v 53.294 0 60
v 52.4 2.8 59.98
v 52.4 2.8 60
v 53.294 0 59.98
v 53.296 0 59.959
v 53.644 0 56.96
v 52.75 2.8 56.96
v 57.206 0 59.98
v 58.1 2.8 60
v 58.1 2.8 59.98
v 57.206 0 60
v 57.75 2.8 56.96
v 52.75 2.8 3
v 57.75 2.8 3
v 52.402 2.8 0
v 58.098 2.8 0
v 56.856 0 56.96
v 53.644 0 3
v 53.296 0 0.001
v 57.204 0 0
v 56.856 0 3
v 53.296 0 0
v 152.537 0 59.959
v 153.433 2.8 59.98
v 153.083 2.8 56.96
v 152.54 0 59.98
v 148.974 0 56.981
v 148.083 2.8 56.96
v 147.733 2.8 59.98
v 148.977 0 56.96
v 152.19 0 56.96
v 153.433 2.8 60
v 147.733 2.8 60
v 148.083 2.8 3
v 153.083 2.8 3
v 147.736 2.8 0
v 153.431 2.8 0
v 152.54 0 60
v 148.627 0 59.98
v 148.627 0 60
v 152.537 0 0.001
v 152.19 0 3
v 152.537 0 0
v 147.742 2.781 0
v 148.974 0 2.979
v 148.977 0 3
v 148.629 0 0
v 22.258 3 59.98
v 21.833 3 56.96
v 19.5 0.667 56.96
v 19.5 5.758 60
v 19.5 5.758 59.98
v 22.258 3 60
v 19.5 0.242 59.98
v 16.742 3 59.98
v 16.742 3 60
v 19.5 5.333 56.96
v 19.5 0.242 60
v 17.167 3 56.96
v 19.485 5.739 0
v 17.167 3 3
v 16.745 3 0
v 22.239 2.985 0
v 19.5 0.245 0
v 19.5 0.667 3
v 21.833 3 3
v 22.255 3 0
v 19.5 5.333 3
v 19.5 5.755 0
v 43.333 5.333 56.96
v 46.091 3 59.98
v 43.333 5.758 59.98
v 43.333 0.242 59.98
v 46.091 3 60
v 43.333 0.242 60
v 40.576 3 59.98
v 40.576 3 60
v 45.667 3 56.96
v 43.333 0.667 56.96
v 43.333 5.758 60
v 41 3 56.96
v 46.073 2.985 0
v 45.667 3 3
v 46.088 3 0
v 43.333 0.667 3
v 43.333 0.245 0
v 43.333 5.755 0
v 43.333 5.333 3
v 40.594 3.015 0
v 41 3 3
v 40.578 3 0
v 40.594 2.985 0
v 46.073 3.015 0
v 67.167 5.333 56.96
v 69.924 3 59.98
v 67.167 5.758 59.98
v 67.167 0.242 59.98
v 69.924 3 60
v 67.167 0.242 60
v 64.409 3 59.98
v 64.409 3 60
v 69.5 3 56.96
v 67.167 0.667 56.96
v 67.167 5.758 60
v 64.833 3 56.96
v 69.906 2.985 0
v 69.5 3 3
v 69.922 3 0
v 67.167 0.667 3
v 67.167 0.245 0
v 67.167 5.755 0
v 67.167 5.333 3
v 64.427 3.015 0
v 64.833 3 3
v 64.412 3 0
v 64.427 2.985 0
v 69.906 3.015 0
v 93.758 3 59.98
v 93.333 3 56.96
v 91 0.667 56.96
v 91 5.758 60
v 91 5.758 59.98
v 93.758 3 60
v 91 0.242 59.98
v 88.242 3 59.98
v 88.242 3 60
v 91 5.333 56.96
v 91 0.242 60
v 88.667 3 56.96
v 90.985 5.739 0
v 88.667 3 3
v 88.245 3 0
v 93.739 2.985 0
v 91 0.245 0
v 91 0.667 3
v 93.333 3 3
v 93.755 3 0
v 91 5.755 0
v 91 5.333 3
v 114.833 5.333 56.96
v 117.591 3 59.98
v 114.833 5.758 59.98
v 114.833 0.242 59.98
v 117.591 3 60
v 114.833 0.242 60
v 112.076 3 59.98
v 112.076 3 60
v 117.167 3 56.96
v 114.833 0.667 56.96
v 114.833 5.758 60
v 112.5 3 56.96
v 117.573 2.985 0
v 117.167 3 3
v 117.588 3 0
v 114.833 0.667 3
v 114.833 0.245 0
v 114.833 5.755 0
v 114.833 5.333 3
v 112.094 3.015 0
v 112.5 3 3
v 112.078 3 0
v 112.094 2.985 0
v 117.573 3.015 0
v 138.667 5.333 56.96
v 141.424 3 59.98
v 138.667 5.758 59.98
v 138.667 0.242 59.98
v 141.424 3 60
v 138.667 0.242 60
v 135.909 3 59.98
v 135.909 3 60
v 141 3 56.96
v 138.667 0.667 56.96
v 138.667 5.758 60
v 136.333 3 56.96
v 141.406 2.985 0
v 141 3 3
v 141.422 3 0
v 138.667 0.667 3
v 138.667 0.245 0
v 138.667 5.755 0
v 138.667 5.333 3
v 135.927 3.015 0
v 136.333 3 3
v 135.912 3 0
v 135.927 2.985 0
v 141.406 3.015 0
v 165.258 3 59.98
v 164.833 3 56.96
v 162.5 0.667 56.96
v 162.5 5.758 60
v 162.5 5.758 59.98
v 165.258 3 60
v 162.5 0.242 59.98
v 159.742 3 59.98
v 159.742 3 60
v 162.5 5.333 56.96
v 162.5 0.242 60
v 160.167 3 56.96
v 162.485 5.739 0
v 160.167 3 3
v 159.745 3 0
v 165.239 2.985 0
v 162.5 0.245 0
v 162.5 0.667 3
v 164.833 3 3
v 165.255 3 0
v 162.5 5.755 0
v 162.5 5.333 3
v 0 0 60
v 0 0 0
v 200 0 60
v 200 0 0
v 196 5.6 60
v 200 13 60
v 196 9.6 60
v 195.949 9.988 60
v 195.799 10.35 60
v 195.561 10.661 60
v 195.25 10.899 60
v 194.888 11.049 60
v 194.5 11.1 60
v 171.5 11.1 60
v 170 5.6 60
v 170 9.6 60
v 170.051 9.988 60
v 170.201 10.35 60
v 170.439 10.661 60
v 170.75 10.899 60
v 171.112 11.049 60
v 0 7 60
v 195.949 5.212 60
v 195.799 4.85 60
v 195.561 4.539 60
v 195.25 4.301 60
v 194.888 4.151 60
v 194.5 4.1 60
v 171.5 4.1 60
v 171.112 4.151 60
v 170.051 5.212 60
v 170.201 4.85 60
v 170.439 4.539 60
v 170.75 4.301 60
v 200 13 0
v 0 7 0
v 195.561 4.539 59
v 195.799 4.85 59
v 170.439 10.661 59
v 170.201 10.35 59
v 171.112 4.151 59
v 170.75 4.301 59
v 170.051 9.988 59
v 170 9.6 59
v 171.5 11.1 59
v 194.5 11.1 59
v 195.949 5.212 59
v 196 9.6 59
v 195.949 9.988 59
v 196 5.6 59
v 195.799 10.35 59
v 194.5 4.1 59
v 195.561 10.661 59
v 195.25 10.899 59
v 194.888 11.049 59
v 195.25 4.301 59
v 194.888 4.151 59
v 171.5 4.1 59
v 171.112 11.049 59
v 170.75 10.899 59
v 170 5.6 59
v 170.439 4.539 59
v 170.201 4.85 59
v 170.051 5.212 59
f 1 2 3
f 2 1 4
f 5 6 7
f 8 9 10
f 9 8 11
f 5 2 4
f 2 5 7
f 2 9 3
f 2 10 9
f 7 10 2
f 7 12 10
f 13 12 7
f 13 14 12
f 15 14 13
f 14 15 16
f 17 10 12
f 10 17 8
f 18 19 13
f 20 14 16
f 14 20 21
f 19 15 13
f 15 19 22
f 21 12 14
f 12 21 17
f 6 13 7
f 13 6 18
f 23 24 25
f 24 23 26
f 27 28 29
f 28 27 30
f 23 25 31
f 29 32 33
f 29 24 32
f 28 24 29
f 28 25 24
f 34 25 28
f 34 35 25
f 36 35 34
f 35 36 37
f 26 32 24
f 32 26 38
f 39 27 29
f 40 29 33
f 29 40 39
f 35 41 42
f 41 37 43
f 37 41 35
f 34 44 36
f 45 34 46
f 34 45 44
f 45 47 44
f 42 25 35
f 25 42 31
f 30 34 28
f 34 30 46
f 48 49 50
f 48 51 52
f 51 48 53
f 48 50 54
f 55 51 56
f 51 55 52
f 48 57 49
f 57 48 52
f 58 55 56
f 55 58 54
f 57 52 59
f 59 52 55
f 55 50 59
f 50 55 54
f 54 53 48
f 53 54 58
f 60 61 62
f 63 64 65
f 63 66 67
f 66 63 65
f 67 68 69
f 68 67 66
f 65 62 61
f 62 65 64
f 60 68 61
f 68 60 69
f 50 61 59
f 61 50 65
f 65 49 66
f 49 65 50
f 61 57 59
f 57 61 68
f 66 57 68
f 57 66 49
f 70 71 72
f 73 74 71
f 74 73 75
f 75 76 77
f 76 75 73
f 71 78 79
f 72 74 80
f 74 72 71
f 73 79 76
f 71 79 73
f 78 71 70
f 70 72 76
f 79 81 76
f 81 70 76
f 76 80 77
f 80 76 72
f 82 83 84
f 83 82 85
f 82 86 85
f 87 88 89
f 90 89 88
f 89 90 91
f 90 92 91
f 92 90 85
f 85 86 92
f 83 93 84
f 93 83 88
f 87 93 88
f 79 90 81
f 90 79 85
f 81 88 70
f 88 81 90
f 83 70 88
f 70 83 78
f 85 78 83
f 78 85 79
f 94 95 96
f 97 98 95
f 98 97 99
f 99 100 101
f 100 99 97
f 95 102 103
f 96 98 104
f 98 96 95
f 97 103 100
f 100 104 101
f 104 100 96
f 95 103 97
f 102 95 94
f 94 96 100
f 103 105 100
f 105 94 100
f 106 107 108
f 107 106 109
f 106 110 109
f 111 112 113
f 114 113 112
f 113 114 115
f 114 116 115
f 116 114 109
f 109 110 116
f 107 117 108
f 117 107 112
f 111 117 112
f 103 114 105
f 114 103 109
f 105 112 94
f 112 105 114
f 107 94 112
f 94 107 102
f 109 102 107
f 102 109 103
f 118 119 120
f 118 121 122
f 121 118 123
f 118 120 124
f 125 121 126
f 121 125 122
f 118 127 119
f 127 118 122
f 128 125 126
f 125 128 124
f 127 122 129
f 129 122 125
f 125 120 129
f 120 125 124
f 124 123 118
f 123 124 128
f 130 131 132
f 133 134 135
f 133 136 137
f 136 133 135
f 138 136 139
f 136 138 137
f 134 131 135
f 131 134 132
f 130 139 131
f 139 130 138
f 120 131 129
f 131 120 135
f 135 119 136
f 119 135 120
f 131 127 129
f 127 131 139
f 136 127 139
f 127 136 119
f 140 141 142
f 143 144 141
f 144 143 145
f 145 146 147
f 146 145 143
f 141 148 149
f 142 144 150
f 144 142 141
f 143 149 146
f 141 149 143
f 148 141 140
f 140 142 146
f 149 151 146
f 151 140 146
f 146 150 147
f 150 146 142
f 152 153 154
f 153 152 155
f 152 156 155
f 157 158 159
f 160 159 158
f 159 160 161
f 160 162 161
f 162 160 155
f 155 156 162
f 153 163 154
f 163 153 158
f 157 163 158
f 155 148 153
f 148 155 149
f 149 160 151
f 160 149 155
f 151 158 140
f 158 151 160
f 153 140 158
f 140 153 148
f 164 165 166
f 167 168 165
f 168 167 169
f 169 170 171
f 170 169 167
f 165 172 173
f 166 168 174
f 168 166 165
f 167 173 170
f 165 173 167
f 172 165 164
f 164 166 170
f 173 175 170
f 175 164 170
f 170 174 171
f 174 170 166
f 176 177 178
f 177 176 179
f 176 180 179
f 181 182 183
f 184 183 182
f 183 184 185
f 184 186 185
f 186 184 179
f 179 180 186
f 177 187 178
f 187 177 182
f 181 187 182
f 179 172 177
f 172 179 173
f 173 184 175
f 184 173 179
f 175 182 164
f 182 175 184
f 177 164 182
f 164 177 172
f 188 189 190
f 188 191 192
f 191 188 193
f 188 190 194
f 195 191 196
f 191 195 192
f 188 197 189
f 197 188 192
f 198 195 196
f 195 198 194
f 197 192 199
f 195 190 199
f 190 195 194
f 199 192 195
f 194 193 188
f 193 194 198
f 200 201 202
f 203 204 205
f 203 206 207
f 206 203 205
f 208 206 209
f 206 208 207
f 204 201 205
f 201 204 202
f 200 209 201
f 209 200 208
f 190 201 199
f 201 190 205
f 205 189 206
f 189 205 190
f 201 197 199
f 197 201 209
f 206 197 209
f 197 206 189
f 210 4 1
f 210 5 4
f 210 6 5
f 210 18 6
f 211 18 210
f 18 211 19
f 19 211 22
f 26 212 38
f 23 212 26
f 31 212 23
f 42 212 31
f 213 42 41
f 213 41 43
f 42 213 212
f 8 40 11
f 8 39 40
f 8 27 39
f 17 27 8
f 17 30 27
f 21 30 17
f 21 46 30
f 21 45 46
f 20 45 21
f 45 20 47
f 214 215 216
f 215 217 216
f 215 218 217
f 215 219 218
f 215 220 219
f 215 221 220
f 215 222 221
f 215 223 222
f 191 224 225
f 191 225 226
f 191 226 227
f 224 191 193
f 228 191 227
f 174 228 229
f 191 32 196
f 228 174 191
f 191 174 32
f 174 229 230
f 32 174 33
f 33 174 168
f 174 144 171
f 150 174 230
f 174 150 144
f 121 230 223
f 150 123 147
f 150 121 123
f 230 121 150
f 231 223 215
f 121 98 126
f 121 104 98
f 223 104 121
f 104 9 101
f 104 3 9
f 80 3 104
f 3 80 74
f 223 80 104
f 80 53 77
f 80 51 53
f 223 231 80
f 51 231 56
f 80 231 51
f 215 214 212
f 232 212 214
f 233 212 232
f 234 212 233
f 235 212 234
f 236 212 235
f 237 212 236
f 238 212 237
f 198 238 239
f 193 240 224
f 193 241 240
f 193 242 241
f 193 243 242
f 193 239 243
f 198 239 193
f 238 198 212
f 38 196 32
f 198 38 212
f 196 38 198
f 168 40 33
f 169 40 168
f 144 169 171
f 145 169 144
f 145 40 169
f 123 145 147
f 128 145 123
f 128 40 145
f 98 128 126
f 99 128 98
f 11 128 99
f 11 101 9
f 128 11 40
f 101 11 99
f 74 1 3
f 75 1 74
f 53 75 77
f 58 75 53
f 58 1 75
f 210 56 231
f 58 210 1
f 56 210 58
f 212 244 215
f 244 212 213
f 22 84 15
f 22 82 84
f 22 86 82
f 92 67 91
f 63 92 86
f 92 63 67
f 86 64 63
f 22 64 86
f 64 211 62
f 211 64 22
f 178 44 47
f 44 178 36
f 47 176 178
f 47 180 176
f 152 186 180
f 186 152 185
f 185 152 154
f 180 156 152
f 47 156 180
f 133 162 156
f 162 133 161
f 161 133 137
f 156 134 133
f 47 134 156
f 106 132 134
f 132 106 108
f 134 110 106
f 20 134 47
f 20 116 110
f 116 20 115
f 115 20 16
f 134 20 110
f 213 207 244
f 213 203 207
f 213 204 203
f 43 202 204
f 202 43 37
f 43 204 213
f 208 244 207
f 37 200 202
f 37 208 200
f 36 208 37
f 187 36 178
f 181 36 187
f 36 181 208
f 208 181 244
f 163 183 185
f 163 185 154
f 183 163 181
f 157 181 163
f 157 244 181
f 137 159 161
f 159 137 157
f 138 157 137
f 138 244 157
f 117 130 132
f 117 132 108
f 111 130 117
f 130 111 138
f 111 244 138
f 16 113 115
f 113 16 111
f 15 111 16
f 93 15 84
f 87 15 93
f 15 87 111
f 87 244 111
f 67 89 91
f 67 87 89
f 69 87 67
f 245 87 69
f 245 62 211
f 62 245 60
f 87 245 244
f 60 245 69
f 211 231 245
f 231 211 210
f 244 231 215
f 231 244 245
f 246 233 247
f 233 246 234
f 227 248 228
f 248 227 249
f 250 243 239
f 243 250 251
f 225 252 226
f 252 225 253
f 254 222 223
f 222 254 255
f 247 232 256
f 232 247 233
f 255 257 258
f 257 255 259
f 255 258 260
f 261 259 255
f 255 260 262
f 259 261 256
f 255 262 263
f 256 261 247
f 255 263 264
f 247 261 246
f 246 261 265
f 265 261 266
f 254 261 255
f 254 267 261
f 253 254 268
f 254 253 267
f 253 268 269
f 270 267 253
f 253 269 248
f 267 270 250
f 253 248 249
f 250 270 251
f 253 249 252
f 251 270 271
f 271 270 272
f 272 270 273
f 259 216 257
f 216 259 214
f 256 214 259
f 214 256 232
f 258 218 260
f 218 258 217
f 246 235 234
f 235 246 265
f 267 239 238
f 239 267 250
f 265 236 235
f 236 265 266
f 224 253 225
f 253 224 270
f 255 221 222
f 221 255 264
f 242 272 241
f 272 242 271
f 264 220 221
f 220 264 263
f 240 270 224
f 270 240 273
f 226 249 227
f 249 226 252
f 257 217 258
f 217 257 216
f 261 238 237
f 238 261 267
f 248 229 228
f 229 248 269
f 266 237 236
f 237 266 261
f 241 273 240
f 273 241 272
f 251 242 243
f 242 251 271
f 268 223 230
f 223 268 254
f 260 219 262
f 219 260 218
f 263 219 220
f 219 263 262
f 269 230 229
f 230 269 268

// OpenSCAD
// file: lib/label.scad
/* Rounded side recess for an adhesive polyester part-number label. */

module rounded_rectangle_2d(length_x, height_z, corner_radius) {
    assert(length_x > 2 * corner_radius,
        "Label recess length must exceed twice the corner radius");
    assert(height_z > 2 * corner_radius,
        "Label recess height must exceed twice the corner radius");

    hull()
        for (x_sign = [-1, 1], z_sign = [-1, 1])
            translate([
                x_sign * (length_x / 2 - corner_radius),
                z_sign * (height_z / 2 - corner_radius)
            ])
                circle(r = corner_radius, $fn = 24);
}

module side_label_recess_cut(
    side,
    wedge_width,
    center_x,
    center_z,
    length_x,
    height_z,
    corner_radius,
    depth,
    epsilon = 0.02
) {
    assert(side == "front" || side == "back",
        "Label side must be front or back");
    assert(depth > 0 && depth < wedge_width,
        "Label recess depth must be positive and less than wedge width");

    if (side == "front")
        translate([center_x, -epsilon, center_z])
            rotate([-90, 0, 0])
                linear_extrude(height = depth + epsilon, convexity = 10)
                    rounded_rectangle_2d(
                        length_x,
                        height_z,
                        corner_radius
                    );
    else
        translate([center_x, wedge_width + epsilon, center_z])
            rotate([90, 0, 0])
                linear_extrude(height = depth + epsilon, convexity = 10)
                    rounded_rectangle_2d(
                        length_x,
                        height_z,
                        corner_radius
                    );
}
// file: lib/dovetail.scad
/* Transverse dovetail geometry with canonical two-ended entry relief. */

function female_dovetail_points(
    center_x,
    head_width,
    neck_width,
    depth,
    epsilon = 0.02
) = [
    [center_x - neck_width / 2, -epsilon],
    [center_x + neck_width / 2, -epsilon],
    [center_x + head_width / 2, depth],
    [center_x - head_width / 2, depth]
];

function male_dovetail_points(center_x, head_width, neck_width, depth) = [
    [center_x - neck_width / 2, 0],
    [center_x + neck_width / 2, 0],
    [center_x + head_width / 2, depth],
    [center_x - head_width / 2, depth]
];

module prism_along_y(points, y_start, length) {
    translate([0, y_start + length, 0])
        rotate([90, 0, 0])
            linear_extrude(height = length, convexity = 10)
                polygon(points = points);
}

module section_at_y(points, y_position, thickness = 0.04) {
    prism_along_y(points, y_position, thickness);
}

module dovetail_socket_cut(
    center_x,
    span_y,
    head_width,
    neck_width,
    depth,
    entry_length,
    entry_relief,
    epsilon = 0.02
) {
    nominal = female_dovetail_points(
        center_x,
        head_width,
        neck_width,
        depth,
        epsilon
    );
    relieved = female_dovetail_points(
        center_x,
        head_width + 2 * entry_relief,
        neck_width + 2 * entry_relief,
        depth,
        epsilon
    );

    prism_along_y(nominal, -epsilon, span_y + 2 * epsilon);

    if (entry_length > 0 && entry_relief > 0) {
        hull() {
            section_at_y(relieved, -epsilon);
            section_at_y(nominal, entry_length);
        }
        hull() {
            section_at_y(nominal, span_y - entry_length);
            section_at_y(relieved, span_y + epsilon);
        }
    }
}

module male_dovetail_rail(
    span_y,
    head_width,
    neck_width,
    depth
) {
    prism_along_y(
        male_dovetail_points(0, head_width, neck_width, depth),
        0,
        span_y
    );
}
// file: lib/components.scad
/* Role-specific wedge components assembled from shared geometry. */

use <wedge.scad>
use <dovetail.scad>
use <registers.scad>
use <label.scad>

function midpoint(a, b) = (a + b) / 2;

function upper_mount_x_1(
    wedge_length,
    nominal_height,
    total_height_range,
    height_step,
    lower_register_center_x,
    lower_register_pitch,
    register_center_depth
) = midpoint(
    upper_register_local_x(
        -2,
        wedge_length,
        total_height_range,
        height_step,
        lower_register_center_x,
        lower_register_pitch,
        register_center_depth,
        nominal_height
    ),
    upper_register_local_x(
        -1,
        wedge_length,
        total_height_range,
        height_step,
        lower_register_center_x,
        lower_register_pitch,
        register_center_depth,
        nominal_height
    )
);

function upper_mount_x_2(
    wedge_length,
    nominal_height,
    total_height_range,
    height_step,
    lower_register_center_x,
    lower_register_pitch,
    register_center_depth
) = midpoint(
    upper_register_local_x(
        2,
        wedge_length,
        total_height_range,
        height_step,
        lower_register_center_x,
        lower_register_pitch,
        register_center_depth,
        nominal_height
    ),
    upper_register_local_x(
        3,
        wedge_length,
        total_height_range,
        height_step,
        lower_register_center_x,
        lower_register_pitch,
        register_center_depth,
        nominal_height
    )
);

function label_recess_length(wedge_length) = min(26, wedge_length * 0.18);
function label_recess_height() = 7;
function label_recess_end_margin() = 4;
function label_recess_top_margin() = 1;
function label_recess_corner_radius() = 1.5;

function label_recess_left_x(wedge_length) =
    wedge_length - label_recess_end_margin() - label_recess_length(wedge_length);

function label_recess_center_x(wedge_length) =
    label_recess_left_x(wedge_length) + label_recess_length(wedge_length) / 2;

function label_recess_center_z(
    wedge_length,
    nominal_height,
    total_height_range
) = wedge_height_at(
        label_recess_left_x(wedge_length),
        wedge_length,
        nominal_height,
        total_height_range
    )
    - label_recess_top_margin()
    - label_recess_height() / 2;

module mounting_socket_cuts(
    mounting_choice,
    wedge_width,
    x_1,
    x_2,
    dovetail_bridge_width,
    dovetail_neck_width,
    dovetail_depth,
    dovetail_entry_length,
    dovetail_entry_relief,
    epsilon = 0.02
) {
    if (mounting_choice == "single_dovetail"
        || mounting_choice == "two_dovetails")
        dovetail_socket_cut(
            x_1,
            wedge_width,
            dovetail_bridge_width,
            dovetail_neck_width,
            dovetail_depth,
            dovetail_entry_length,
            dovetail_entry_relief,
            epsilon
        );

    if (mounting_choice == "two_dovetails")
        dovetail_socket_cut(
            x_2,
            wedge_width,
            dovetail_bridge_width,
            dovetail_neck_width,
            dovetail_depth,
            dovetail_entry_length,
            dovetail_entry_relief,
            epsilon
        );
}

module lower_base_model(
    wedge_length,
    wedge_width,
    nominal_height,
    total_height_range,
    mounting_choice,
    dovetail_bridge_width,
    dovetail_neck_width,
    dovetail_depth,
    dovetail_entry_length,
    dovetail_entry_relief,
    include_registers,
    lower_register_center_x,
    lower_register_pitch,
    register_center_depth,
    diamond_square_side,
    diamond_entry_length,
    diamond_entry_relief,
    include_label_recess,
    label_recess_depth,
    epsilon = 0.02
) {
    lower_mount_x_1 = wedge_length * 0.25;
    lower_mount_x_2 = wedge_length * 0.75;

    difference() {
        smooth_wedge(
            wedge_length,
            wedge_width,
            nominal_height,
            total_height_range
        );

        mounting_socket_cuts(
            mounting_choice,
            wedge_width,
            lower_mount_x_1,
            lower_mount_x_2,
            dovetail_bridge_width,
            dovetail_neck_width,
            dovetail_depth,
            dovetail_entry_length,
            dovetail_entry_relief,
            epsilon
        );

        if (include_registers)
            lower_register_row(
                wedge_width,
                lower_register_center_x,
                lower_register_pitch,
                register_center_depth,
                diamond_square_side,
                diamond_entry_length,
                diamond_entry_relief,
                epsilon
            );

        if (include_label_recess)
            side_label_recess_cut(
                "back",
                wedge_width,
                label_recess_center_x(wedge_length),
                label_recess_center_z(
                    wedge_length,
                    nominal_height,
                    total_height_range
                ),
                label_recess_length(wedge_length),
                label_recess_height(),
                label_recess_corner_radius(),
                label_recess_depth,
                epsilon
            );
    }
}

module upper_slide_model(
    wedge_length,
    wedge_width,
    nominal_height,
    total_height_range,
    height_step,
    mounting_choice,
    dovetail_bridge_width,
    dovetail_neck_width,
    dovetail_depth,
    dovetail_entry_length,
    dovetail_entry_relief,
    include_registers,
    lower_register_center_x,
    lower_register_pitch,
    register_center_depth,
    diamond_square_side,
    diamond_entry_length,
    diamond_entry_relief,
    include_label_recess,
    label_recess_depth,
    epsilon = 0.02
) {
    upper_mount_1 = upper_mount_x_1(
        wedge_length,
        nominal_height,
        total_height_range,
        height_step,
        lower_register_center_x,
        lower_register_pitch,
        register_center_depth
    );
    upper_mount_2 = upper_mount_x_2(
        wedge_length,
        nominal_height,
        total_height_range,
        height_step,
        lower_register_center_x,
        lower_register_pitch,
        register_center_depth
    );

    difference() {
        smooth_wedge(
            wedge_length,
            wedge_width,
            nominal_height,
            total_height_range
        );

        mounting_socket_cuts(
            mounting_choice,
            wedge_width,
            upper_mount_1,
            upper_mount_2,
            dovetail_bridge_width,
            dovetail_neck_width,
            dovetail_depth,
            dovetail_entry_length,
            dovetail_entry_relief,
            epsilon
        );

        if (include_registers)
            upper_register_row(
                wedge_length,
                wedge_width,
                nominal_height,
                total_height_range,
                height_step,
                lower_register_center_x,
                lower_register_pitch,
                register_center_depth,
                diamond_square_side,
                diamond_entry_length,
                diamond_entry_relief,
                epsilon
            );

        if (include_label_recess)
            side_label_recess_cut(
                "front",
                wedge_width,
                label_recess_center_x(wedge_length),
                label_recess_center_z(
                    wedge_length,
                    nominal_height,
                    total_height_range
                ),
                label_recess_length(wedge_length),
                label_recess_height(),
                label_recess_corner_radius(),
                label_recess_depth,
                epsilon
            );
    }
}
// file: lib/registers.scad
/* Diamond garden-stake registers and seven-position kinematics. */

function lock_positions() = [-3, -2, -1, 0, 1, 2, 3];

function travel_per_height_step(
    wedge_length,
    total_height_range,
    height_step
) = height_step / (total_height_range / wedge_length);

function lock_shift(
    position,
    wedge_length,
    total_height_range,
    height_step
) = position * travel_per_height_step(
    wedge_length,
    total_height_range,
    height_step
);

function lock_height(position, nominal_height, height_step) =
    nominal_height + position * height_step;

function lower_register_x(position, center_x, pitch) =
    center_x + position * pitch;

function nominal_lock_dx(nominal_height, register_center_depth) =
    nominal_height - 2 * register_center_depth;

function upper_register_local_x(
    position,
    wedge_length,
    total_height_range,
    height_step,
    lower_center_x,
    lower_pitch,
    register_center_depth,
    nominal_height
) =
    wedge_length
    + lock_shift(position, wedge_length, total_height_range, height_step)
    - lower_register_x(position, lower_center_x, lower_pitch)
    - nominal_lock_dx(nominal_height, register_center_depth);

function upper_register_global_x(
    position,
    wedge_length,
    total_height_range,
    height_step,
    upper_local_x
) =
    wedge_length
    + lock_shift(position, wedge_length, total_height_range, height_step)
    - upper_local_x;

function diamond_half_diagonal(square_side) = square_side / sqrt(2);

function diamond_points(center_x, center_z, square_side) = [
    [center_x, center_z - diamond_half_diagonal(square_side)],
    [center_x + diamond_half_diagonal(square_side), center_z],
    [center_x, center_z + diamond_half_diagonal(square_side)],
    [center_x - diamond_half_diagonal(square_side), center_z]
];

module register_prism_along_y(points, y_start, length) {
    translate([0, y_start + length, 0])
        rotate([90, 0, 0])
            linear_extrude(height = length, convexity = 10)
                polygon(points = points);
}

module register_section_at_y(points, y_position, thickness = 0.04) {
    register_prism_along_y(points, y_position, thickness);
}

module diamond_tunnel_cut(
    center_x,
    center_z,
    span_y,
    square_side,
    entry_length,
    entry_relief,
    epsilon = 0.02
) {
    nominal = diamond_points(center_x, center_z, square_side);
    relieved = diamond_points(
        center_x,
        center_z,
        square_side + 2 * entry_relief
    );

    register_prism_along_y(
        nominal,
        -epsilon,
        span_y + 2 * epsilon
    );

    if (entry_length > 0 && entry_relief > 0) {
        hull() {
            register_section_at_y(relieved, -epsilon);
            register_section_at_y(nominal, entry_length);
        }
        hull() {
            register_section_at_y(nominal, span_y - entry_length);
            register_section_at_y(relieved, span_y + epsilon);
        }
    }
}

module lower_register_row(
    wedge_width,
    center_x,
    pitch,
    center_z,
    square_side,
    entry_length,
    entry_relief,
    epsilon = 0.02
) {
    for (position = lock_positions())
        diamond_tunnel_cut(
            lower_register_x(position, center_x, pitch),
            center_z,
            wedge_width,
            square_side,
            entry_length,
            entry_relief,
            epsilon
        );
}

module upper_register_row(
    wedge_length,
    wedge_width,
    nominal_height,
    total_height_range,
    height_step,
    lower_center_x,
    lower_pitch,
    center_z,
    square_side,
    entry_length,
    entry_relief,
    epsilon = 0.02
) {
    for (position = lock_positions())
        diamond_tunnel_cut(
            upper_register_local_x(
                position,
                wedge_length,
                total_height_range,
                height_step,
                lower_center_x,
                lower_pitch,
                center_z,
                nominal_height
            ),
            center_z,
            wedge_width,
            square_side,
            entry_length,
            entry_relief,
            epsilon
        );
}

module rod_along_y(x, y_start, z, length, radius, facets = 32) {
    translate([x, y_start, z])
        rotate([-90, 0, 0])
            cylinder(h = length, r = radius, $fn = facets);
}

module garden_stake_preview(
    lower_x,
    lower_z,
    upper_x,
    upper_z,
    wedge_width,
    wire_diameter,
    handle_offset = 10,
    tip_overhang = 8
) {
    radius = wire_diameter / 2;
    y_start = -handle_offset;
    leg_length = wedge_width + handle_offset + tip_overhang;

    rod_along_y(lower_x, y_start, lower_z, leg_length, radius);
    rod_along_y(upper_x, y_start, upper_z, leg_length, radius);

    hull() {
        translate([lower_x, y_start, lower_z]) sphere(r = radius, $fn = 24);
        translate([upper_x, y_start, upper_z]) sphere(r = radius, $fn = 24);
    }
}
// file: lib/wedge.scad
/* Shared smooth wedge geometry. */

function wedge_thin_end(nominal_height, total_height_range) =
    (nominal_height - total_height_range) / 2;

function wedge_thick_end(nominal_height, total_height_range) =
    (nominal_height + total_height_range) / 2;

function wedge_slope(wedge_length, total_height_range) =
    total_height_range / wedge_length;

function wedge_angle(wedge_length, total_height_range) =
    atan(wedge_slope(wedge_length, total_height_range));

function wedge_height_at(
    x,
    wedge_length,
    nominal_height,
    total_height_range
) =
    wedge_thin_end(nominal_height, total_height_range)
    + wedge_slope(wedge_length, total_height_range) * x;

module smooth_wedge(
    wedge_length,
    wedge_width,
    nominal_height,
    total_height_range
) {
    thin_end = wedge_thin_end(nominal_height, total_height_range);
    thick_end = wedge_thick_end(nominal_height, total_height_range);

    polyhedron(
        points = [
            [0,            0,           0],
            [wedge_length, 0,           0],
            [wedge_length, wedge_width, 0],
            [0,            wedge_width, 0],
            [0,            0,           thin_end],
            [wedge_length, 0,           thick_end],
            [wedge_length, wedge_width, thick_end],
            [0,            wedge_width, thin_end]
        ],
        faces = [
            [0, 3, 2, 1],
            [0, 1, 5, 4],
            [1, 2, 6, 5],
            [2, 3, 7, 6],
            [3, 0, 4, 7],
            [4, 5, 6, 7]
        ],
        convexity = 10
    );
}
// main file
/*
  Locking Wedge — upper slide
  Batch 003

  Default output is rotated onto the side opposite the label recess,
  leaving the rounded label pocket facing upward for support-free printing.
  Reverse this part over the lower base during assembly.
*/

use <lib/wedge.scad>
use <lib/registers.scad>
use <lib/components.scad>

// ---------- Wedge ----------

wedge_length = 200;       // [100:1:200]
wedge_width = 60;         // [20:1:180]
nominal_height = 20;      // [10:0.5:50]
total_height_range = 6;   // [2:0.5:20]
height_step = 1.0;        // [0.5:0.5:2]
print_on_side = true;

// ---------- Transverse mounting sockets ----------

mounting_choice = "two_dovetails"; // [none:No mounting sockets,single_dovetail:One female dovetail,two_dovetails:Two female dovetails]
dovetail_bridge_width = 5.0; // [4:0.1:6]
dovetail_neck_width = 3.2;   // [2.4:0.1:5]
dovetail_depth = 2.8;        // [1.5:0.1:4]
dovetail_entry_length = 3.0; // [1:0.5:8]
dovetail_entry_relief = 0.35;// [0.1:0.05:1]

// ---------- Garden-stake registers ----------

include_registers = true;
lower_register_center_x = 95; // Must match lower_base.scad
lower_register_pitch = 9.5;   // Must match lower_base.scad
register_center_depth = 3.0;  // [2.5:0.1:5]
wire_diameter = 3.0;          // [2:0.1:5]
diamond_clearance = 0.30;     // [0.1:0.05:0.8]
diamond_entry_length = 3.0;   // [1:0.5:8]
diamond_entry_relief = 0.30;  // [0.1:0.05:0.8]

// ---------- Adhesive label recess ----------

include_label_recess = true;
label_recess_depth = 1.0; // [0.8:0.1:1.2]

epsilon = 0.02;
diamond_square_side = wire_diameter + diamond_clearance;
half_diagonal = diamond_half_diagonal(diamond_square_side);
thick_end = wedge_thick_end(nominal_height, total_height_range);

function upper_x(position) = upper_register_local_x(
    position,
    wedge_length,
    total_height_range,
    height_step,
    lower_register_center_x,
    lower_register_pitch,
    register_center_depth,
    nominal_height
);

minimum_upper_x = upper_x(-3);
maximum_upper_x = upper_x(3);
minimum_register_roof = wedge_height_at(
    minimum_upper_x,
    wedge_length,
    nominal_height,
    total_height_range
) - register_center_depth - half_diagonal;
mount_x_1 = upper_mount_x_1(
    wedge_length,
    nominal_height,
    total_height_range,
    height_step,
    lower_register_center_x,
    lower_register_pitch,
    register_center_depth
);
mount_x_2 = upper_mount_x_2(
    wedge_length,
    nominal_height,
    total_height_range,
    height_step,
    lower_register_center_x,
    lower_register_pitch,
    register_center_depth
);
label_left = label_recess_left_x(wedge_length);
label_bottom = label_recess_center_z(
    wedge_length,
    nominal_height,
    total_height_range
) - label_recess_height() / 2;
nearest_mount_clearance_1 = min(
    mount_x_1 - upper_x(-2),
    upper_x(-1) - mount_x_1
) - dovetail_bridge_width / 2 - half_diagonal;
nearest_mount_clearance_2 = min(
    mount_x_2 - upper_x(2),
    upper_x(3) - mount_x_2
) - dovetail_bridge_width / 2 - half_diagonal;

// ---------- Validation ----------

assert(wedge_length > 0 && wedge_width > 0,
    "Wedge dimensions must be positive");
assert(nominal_height > total_height_range,
    "nominal_height must exceed total_height_range");
assert(height_step * 6 == total_height_range,
    "Seven positions require six height steps across the total range");
assert(dovetail_neck_width < dovetail_bridge_width,
    "Dovetail neck must be narrower than bridge width");
assert(dovetail_bridge_width <= 6,
    "Flat-print dovetail bridge should remain at or below 6 mm");
assert(register_center_depth > half_diagonal + 0.4,
    "Diamond tunnel needs at least 0.4 mm outer skin");
assert(minimum_upper_x > half_diagonal,
    "First upper register is outside the wedge");
assert(maximum_upper_x < wedge_length - half_diagonal,
    "Last upper register is outside the wedge");
assert(minimum_register_roof > 2,
    "Upper register row leaves less than 2 mm to the mating face");
assert(nearest_mount_clearance_1 > 4,
    "First upper dovetail is too close to a register");
assert(nearest_mount_clearance_2 > 4,
    "Second upper dovetail is too close to a register");
assert(label_recess_depth >= 0.8 && label_recess_depth <= 1.2,
    "Label recess depth must remain between 0.8 and 1.2 mm");
assert(label_left > maximum_upper_x + half_diagonal + 4,
    "Label recess is too close to the nearest upper register");
assert(label_bottom > 0.8,
    "Label recess is too close to the flat external face");

// ---------- Output ----------

module upper_output() {
    upper_slide_model(
        wedge_length,
        wedge_width,
        nominal_height,
        total_height_range,
        height_step,
        mounting_choice,
        dovetail_bridge_width,
        dovetail_neck_width,
        dovetail_depth,
        dovetail_entry_length,
        dovetail_entry_relief,
        include_registers,
        lower_register_center_x,
        lower_register_pitch,
        register_center_depth,
        diamond_square_side,
        diamond_entry_length,
        diamond_entry_relief,
        include_label_recess,
        label_recess_depth,
        epsilon
    );
}

if (print_on_side)
    translate([0, 0, wedge_width])
        rotate([-90, 0, 0])
            upper_output();
else
    upper_output();

// ---------- Console report ----------

echo(str("Part: upper slide"));
echo(str("Wedge: ", wedge_length, " x ", wedge_width, " mm"));
echo(str("Upper register local X range: ", minimum_upper_x,
    " to ", maximum_upper_x, " mm"));
echo(str("Register travel per 1 mm height step: ",
    travel_per_height_step(wedge_length, total_height_range, height_step),
    " mm"));
echo(str("Centered lock X offset: ",
    nominal_lock_dx(nominal_height, register_center_depth), " mm"));
echo(str("Upper dovetail centers: ", mount_x_1,
    " and ", mount_x_2, " mm"));
echo(str("Minimum dovetail/register edge clearances: ",
    nearest_mount_clearance_1, " and ", nearest_mount_clearance_2, " mm"));
echo(str("Diamond square side: ", diamond_square_side, " mm"));
echo(str("Label recess: ", label_recess_length(wedge_length),
    " x ", label_recess_height(), " x ", label_recess_depth, " mm"));
